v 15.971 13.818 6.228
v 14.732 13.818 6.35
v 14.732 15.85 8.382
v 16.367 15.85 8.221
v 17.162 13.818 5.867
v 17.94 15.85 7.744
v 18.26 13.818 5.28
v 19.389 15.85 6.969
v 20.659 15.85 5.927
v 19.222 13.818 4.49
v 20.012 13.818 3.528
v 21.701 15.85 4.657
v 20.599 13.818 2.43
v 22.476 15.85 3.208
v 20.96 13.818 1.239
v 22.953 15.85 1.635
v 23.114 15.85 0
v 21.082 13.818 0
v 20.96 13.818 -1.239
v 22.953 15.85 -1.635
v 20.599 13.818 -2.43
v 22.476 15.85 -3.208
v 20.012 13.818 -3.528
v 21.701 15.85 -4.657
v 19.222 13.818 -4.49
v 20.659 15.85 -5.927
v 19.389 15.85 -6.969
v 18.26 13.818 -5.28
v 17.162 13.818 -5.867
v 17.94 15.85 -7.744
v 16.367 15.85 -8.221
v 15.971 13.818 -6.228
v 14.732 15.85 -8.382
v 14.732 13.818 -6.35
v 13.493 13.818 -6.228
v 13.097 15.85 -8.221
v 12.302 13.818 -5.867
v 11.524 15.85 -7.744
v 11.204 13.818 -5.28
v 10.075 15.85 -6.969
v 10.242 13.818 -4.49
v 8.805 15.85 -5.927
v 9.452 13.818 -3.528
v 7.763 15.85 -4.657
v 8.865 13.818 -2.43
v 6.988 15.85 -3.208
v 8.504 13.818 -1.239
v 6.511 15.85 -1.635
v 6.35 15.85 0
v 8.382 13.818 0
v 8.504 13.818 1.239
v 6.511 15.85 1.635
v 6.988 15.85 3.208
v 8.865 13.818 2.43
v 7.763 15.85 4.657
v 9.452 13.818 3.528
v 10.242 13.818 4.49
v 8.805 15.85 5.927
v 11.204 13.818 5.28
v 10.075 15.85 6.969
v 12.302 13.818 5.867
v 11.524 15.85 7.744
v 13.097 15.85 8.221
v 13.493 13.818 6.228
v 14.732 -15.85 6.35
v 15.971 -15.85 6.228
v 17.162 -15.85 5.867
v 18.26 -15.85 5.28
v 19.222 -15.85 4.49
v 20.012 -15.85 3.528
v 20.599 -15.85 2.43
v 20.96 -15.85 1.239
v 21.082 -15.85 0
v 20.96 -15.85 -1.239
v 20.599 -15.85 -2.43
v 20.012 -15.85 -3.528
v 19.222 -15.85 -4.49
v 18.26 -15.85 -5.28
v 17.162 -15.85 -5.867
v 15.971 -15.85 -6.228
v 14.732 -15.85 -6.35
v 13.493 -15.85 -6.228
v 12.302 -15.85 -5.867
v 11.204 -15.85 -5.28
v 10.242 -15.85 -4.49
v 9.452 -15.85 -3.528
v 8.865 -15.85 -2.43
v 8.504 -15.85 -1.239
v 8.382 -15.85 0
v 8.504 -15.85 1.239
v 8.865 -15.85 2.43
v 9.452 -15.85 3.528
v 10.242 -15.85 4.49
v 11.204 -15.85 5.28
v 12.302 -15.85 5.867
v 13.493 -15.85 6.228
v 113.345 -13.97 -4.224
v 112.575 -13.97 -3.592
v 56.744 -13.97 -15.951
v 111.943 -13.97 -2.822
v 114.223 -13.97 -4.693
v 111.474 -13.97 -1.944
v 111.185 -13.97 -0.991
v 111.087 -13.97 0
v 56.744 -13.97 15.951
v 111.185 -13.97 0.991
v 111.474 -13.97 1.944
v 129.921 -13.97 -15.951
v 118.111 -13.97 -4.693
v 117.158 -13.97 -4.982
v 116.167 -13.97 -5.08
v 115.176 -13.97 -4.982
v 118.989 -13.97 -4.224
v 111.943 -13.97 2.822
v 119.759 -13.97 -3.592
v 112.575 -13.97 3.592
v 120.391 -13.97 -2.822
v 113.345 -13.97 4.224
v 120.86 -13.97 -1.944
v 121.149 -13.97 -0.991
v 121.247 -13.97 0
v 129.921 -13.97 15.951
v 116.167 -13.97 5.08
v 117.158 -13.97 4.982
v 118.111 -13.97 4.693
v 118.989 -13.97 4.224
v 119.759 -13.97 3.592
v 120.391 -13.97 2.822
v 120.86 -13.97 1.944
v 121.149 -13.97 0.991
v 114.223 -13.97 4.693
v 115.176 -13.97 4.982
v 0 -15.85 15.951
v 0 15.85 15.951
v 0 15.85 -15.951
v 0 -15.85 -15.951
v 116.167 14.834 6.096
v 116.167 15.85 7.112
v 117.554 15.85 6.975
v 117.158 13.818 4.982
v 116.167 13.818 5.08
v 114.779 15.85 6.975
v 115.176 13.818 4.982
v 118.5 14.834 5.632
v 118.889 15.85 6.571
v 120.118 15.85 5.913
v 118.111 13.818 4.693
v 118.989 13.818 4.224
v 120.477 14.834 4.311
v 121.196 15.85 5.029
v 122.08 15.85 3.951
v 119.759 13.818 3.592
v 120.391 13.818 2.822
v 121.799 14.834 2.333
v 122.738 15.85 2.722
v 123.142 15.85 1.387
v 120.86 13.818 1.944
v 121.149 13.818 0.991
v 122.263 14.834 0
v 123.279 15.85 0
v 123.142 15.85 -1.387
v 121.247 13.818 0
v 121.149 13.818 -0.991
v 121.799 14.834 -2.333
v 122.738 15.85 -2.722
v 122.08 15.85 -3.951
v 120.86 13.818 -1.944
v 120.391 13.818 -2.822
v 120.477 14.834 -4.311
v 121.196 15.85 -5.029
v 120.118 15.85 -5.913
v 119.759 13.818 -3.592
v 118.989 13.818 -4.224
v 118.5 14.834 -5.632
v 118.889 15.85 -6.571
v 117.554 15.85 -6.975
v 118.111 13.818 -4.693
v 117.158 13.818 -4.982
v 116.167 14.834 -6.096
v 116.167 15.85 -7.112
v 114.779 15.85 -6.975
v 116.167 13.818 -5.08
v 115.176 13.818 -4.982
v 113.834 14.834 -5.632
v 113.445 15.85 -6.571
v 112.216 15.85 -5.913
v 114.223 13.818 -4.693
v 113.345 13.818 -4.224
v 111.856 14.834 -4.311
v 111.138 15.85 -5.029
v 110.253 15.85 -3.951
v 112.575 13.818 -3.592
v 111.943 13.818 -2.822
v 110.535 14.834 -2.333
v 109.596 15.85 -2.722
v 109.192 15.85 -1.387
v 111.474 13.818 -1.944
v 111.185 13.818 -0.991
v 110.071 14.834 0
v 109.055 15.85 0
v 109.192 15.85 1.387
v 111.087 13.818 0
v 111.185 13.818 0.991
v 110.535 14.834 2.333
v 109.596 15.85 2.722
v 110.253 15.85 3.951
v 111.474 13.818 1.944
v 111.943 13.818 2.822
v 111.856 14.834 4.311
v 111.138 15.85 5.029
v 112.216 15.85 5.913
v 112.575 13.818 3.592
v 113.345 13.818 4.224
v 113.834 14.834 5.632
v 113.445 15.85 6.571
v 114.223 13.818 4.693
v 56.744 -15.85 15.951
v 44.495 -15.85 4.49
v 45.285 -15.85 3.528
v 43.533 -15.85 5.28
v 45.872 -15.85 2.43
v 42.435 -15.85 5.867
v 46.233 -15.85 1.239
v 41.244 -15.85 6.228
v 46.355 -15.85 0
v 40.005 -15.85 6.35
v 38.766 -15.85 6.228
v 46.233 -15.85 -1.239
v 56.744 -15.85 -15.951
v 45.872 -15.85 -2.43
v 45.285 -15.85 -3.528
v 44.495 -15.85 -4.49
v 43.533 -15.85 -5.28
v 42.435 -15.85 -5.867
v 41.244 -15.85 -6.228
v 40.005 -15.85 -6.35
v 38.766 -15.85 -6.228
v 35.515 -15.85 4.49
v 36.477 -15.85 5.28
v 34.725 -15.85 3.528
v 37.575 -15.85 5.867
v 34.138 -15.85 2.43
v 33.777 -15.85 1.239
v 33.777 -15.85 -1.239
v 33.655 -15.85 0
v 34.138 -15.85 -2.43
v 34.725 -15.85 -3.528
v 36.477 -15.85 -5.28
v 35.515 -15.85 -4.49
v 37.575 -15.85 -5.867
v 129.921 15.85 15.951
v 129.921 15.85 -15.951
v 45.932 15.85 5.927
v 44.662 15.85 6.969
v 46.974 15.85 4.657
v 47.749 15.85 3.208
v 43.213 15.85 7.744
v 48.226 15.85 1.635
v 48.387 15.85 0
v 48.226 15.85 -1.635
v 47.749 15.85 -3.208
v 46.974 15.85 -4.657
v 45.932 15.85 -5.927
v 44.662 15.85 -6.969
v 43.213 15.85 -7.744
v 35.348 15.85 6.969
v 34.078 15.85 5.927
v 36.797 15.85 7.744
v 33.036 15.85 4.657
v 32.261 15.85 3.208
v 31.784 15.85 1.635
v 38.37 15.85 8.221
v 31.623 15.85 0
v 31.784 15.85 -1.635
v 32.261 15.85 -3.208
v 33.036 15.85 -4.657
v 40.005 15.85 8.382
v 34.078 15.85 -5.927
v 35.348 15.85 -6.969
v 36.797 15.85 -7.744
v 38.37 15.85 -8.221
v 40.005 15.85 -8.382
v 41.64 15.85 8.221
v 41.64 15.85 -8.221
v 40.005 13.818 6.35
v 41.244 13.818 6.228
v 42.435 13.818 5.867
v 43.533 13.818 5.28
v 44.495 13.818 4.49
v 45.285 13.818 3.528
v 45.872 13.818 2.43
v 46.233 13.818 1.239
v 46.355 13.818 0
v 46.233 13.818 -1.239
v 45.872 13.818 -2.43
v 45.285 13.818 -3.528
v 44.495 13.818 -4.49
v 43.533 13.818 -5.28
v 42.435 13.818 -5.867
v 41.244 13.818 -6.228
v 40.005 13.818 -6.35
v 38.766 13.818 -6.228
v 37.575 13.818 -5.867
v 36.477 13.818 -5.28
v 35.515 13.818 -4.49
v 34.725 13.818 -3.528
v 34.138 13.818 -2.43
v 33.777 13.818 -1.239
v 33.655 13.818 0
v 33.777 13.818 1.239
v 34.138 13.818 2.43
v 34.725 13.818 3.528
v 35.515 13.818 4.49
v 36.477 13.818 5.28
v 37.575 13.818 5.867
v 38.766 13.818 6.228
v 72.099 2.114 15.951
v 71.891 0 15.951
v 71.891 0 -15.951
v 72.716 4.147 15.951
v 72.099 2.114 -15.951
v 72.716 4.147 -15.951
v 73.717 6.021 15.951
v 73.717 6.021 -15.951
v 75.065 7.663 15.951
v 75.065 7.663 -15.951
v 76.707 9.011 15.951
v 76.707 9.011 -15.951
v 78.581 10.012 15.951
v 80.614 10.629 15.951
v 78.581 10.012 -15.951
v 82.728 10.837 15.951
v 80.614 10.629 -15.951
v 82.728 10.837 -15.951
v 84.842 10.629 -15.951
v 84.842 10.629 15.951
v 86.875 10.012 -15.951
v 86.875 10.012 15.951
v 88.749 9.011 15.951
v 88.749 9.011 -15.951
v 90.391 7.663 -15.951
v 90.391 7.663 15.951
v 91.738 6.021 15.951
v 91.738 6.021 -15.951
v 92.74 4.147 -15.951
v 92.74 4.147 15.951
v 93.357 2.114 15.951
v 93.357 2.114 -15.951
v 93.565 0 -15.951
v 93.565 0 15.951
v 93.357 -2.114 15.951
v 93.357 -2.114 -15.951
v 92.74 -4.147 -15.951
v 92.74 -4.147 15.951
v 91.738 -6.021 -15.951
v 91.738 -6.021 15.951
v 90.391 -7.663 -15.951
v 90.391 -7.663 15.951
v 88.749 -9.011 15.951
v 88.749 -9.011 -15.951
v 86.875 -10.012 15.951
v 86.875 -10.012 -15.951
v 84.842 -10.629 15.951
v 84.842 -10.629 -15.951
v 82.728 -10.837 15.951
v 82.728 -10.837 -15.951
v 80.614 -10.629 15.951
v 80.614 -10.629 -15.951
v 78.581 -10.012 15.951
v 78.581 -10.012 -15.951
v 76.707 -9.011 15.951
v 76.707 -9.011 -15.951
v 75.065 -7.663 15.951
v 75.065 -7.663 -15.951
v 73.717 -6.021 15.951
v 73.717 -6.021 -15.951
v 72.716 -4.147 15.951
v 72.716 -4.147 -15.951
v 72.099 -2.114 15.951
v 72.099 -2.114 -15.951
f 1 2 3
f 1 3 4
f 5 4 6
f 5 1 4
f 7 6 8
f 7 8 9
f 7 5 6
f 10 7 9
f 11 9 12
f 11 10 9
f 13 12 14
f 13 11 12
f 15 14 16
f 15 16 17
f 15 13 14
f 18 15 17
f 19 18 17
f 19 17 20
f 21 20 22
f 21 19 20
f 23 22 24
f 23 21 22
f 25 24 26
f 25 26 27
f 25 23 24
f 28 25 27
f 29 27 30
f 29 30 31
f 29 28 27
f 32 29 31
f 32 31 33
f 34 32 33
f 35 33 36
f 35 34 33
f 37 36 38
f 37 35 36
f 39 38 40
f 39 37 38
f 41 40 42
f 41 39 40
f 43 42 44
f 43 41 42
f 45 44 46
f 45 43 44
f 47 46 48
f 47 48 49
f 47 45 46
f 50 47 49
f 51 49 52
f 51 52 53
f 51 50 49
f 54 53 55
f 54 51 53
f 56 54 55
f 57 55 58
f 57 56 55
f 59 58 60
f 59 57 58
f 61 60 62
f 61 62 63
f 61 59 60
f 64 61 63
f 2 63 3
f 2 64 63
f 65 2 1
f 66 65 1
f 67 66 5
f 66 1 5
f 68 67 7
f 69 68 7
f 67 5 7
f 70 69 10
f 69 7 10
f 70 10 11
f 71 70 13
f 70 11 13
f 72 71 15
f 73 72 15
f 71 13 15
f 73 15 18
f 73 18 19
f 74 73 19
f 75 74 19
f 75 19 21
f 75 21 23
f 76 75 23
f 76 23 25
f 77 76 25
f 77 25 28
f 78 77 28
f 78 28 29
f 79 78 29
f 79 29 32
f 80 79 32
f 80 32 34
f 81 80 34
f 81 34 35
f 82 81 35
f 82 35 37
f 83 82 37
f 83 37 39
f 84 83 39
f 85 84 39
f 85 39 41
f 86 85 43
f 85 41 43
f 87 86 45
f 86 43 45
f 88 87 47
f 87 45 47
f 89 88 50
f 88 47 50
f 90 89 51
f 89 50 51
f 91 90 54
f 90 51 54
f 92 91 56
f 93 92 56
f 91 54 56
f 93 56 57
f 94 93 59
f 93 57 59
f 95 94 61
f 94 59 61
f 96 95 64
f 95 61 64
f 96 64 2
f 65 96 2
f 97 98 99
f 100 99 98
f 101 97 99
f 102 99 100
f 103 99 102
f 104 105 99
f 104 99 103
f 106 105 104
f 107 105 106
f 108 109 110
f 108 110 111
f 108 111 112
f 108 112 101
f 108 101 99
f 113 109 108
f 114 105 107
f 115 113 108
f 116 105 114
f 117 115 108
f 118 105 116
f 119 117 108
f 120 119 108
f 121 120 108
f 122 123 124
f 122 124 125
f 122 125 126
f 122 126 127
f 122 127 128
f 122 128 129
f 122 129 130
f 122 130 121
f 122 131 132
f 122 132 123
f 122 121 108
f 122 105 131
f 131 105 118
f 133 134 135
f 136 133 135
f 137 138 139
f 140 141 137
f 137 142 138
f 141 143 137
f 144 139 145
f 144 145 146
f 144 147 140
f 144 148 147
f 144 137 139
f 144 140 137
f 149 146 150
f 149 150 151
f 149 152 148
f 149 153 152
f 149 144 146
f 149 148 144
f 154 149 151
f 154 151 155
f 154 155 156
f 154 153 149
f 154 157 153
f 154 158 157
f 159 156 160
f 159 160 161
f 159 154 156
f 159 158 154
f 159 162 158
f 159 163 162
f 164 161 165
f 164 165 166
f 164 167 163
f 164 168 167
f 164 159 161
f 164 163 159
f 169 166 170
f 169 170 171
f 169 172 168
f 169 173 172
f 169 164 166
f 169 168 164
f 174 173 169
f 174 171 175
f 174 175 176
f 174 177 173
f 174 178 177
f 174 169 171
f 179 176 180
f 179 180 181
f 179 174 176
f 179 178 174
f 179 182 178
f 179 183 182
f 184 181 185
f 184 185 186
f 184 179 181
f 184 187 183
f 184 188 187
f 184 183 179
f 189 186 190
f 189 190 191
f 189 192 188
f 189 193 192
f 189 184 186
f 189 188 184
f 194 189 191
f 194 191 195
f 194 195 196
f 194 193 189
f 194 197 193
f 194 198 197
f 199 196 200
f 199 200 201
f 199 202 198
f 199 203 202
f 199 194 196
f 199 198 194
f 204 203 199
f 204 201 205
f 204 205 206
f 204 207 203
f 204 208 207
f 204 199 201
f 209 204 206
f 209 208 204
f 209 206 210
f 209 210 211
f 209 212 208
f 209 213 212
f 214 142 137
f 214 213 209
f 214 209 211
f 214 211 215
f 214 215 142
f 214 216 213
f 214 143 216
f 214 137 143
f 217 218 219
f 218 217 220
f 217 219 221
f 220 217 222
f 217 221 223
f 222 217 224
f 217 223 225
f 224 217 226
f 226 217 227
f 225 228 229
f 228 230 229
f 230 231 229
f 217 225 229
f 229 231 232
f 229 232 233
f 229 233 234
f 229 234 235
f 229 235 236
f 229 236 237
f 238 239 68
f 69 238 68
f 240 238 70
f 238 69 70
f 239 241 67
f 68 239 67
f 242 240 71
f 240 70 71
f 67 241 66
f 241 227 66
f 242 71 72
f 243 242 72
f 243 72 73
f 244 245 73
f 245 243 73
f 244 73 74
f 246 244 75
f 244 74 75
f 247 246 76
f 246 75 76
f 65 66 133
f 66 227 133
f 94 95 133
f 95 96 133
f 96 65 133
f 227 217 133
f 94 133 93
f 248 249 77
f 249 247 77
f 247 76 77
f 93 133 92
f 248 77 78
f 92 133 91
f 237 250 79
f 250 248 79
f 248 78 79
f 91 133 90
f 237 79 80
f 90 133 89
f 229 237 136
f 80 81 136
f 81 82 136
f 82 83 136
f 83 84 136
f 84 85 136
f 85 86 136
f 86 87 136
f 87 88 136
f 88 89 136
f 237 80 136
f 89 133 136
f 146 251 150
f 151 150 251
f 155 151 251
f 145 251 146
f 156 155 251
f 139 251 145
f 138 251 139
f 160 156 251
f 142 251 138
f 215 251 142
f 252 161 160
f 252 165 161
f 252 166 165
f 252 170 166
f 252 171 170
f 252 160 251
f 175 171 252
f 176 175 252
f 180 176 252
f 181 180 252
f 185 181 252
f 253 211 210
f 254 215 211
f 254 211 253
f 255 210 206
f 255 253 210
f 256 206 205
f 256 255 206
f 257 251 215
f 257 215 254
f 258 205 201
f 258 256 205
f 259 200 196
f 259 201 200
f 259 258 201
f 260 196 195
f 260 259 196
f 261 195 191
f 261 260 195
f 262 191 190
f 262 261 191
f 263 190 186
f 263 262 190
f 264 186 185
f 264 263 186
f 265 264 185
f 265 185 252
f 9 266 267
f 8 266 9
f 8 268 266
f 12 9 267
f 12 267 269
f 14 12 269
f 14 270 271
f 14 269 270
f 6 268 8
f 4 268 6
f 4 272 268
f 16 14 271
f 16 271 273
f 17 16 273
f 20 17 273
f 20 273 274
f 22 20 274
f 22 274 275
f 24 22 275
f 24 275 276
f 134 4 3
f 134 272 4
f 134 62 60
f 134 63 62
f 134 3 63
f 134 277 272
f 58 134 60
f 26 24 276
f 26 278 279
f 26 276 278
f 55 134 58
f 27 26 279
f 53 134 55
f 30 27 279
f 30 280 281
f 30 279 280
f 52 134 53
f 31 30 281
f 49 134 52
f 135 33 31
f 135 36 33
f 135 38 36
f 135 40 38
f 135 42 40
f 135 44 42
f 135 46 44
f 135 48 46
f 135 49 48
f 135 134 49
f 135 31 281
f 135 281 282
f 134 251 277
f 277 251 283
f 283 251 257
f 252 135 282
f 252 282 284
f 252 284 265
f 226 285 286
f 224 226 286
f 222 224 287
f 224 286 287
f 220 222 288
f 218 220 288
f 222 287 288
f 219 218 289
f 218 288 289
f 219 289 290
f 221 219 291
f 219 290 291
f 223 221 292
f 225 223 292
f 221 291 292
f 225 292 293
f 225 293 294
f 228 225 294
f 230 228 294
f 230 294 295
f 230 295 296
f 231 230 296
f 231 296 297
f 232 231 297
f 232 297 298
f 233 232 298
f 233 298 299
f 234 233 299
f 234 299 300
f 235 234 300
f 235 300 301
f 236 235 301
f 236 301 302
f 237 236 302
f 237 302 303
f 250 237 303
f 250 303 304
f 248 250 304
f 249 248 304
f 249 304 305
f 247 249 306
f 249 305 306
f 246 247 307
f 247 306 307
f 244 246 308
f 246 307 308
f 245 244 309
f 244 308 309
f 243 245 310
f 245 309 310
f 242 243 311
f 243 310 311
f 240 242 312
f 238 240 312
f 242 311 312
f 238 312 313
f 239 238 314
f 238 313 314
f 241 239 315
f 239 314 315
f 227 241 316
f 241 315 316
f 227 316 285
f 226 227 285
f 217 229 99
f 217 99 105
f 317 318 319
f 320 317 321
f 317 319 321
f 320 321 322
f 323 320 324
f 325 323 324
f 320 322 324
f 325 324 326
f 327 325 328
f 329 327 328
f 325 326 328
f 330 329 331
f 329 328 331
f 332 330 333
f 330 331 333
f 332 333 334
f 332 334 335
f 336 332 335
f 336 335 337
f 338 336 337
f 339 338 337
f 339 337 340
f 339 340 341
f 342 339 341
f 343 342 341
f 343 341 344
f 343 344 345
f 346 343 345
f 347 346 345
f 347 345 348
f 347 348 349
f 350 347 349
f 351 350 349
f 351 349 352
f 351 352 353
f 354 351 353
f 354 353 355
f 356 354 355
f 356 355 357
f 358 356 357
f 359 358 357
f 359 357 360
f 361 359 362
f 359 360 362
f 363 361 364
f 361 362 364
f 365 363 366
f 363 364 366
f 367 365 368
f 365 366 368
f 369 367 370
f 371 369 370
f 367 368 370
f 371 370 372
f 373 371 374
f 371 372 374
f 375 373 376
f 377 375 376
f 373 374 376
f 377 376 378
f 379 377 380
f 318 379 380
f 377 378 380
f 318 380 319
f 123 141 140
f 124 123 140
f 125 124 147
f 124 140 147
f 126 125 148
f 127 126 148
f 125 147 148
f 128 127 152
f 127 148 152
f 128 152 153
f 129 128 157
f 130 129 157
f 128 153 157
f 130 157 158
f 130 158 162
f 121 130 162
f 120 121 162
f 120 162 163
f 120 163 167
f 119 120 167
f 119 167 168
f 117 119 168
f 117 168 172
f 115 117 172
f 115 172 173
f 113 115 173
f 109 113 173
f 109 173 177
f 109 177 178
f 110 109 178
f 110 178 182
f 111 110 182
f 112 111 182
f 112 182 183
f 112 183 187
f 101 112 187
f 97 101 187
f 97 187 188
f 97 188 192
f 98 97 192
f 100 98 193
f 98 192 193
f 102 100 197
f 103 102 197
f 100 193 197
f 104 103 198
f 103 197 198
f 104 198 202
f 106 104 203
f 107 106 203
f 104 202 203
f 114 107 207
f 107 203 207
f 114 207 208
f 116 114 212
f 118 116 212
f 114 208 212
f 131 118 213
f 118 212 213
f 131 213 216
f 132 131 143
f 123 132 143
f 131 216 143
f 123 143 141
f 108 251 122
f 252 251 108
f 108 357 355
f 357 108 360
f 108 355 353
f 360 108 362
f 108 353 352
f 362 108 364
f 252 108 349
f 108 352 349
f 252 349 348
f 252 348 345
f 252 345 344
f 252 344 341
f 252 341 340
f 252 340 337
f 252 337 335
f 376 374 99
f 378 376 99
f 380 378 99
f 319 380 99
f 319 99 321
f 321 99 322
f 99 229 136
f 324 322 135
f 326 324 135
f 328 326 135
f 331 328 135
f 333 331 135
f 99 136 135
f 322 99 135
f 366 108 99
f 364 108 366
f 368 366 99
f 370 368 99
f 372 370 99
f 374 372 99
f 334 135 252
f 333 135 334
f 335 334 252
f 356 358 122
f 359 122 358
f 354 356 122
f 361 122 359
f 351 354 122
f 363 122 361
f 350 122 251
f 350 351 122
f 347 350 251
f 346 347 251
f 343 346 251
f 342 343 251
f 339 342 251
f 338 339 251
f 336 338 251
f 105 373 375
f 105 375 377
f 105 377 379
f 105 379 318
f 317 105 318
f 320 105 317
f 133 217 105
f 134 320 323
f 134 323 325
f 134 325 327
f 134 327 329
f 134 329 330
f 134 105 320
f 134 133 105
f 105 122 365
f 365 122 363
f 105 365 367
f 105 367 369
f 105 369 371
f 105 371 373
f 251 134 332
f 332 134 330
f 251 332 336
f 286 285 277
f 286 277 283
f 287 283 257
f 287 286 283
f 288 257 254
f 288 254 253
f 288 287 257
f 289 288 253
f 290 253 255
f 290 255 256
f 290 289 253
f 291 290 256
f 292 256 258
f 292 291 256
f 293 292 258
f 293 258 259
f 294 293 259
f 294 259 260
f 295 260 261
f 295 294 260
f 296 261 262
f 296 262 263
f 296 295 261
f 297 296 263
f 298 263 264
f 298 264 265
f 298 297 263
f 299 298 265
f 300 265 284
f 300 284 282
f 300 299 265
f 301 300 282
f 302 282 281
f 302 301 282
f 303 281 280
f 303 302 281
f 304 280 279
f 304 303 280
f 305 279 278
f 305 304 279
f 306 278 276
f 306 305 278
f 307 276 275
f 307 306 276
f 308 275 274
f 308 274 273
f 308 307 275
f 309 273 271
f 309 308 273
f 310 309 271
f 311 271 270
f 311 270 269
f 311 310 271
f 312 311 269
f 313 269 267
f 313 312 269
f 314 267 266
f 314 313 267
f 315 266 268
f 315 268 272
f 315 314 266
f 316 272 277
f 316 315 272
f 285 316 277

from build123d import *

# Parameters (mm, degrees)
SKETCH1_W           = 31.9024
SKETCH1_H           = 31.6992
BOSS_EXTRUDE1_DEPTH = 129.921
SKETCH2_W           = 73.1774
SKETCH2_H           = 31.9024
CUT_EXTRUDE1_DEPTH  = 1.8796
SKETCH4_R           = 6.35
SKETCH4_R_2         = 5.08
CUT_EXTRUDE2_DEPTH  = 135.68016299
CHAMFER2_SIZE       = 2.032
SKETCH9_R           = 10.836935607
CUT_EXTRUDE3_DEPTH  = 135.716143008


with BuildPart() as part:
    # Sketch1 → Boss-Extrude1 (new body)
    with BuildSketch(Plane(origin=(0, 0, 0), x_dir=(0, 0, -1), z_dir=(1, 0, 0))):
        Rectangle(SKETCH1_W, SKETCH1_H)
    extrude(amount=BOSS_EXTRUDE1_DEPTH)

    # Sketch2 → Cut-Extrude1 (cut)
    with BuildSketch(Plane.XZ.offset(15.8496)):
        with Locations((93.3323, 0)):
            Rectangle(SKETCH2_W, SKETCH2_H)
    extrude(amount=-CUT_EXTRUDE1_DEPTH, mode=Mode.SUBTRACT)

    # Sketch4 → Cut-Extrude2 (cut, through all)
    with BuildSketch(Plane(origin=(0, 15.8496, 0), x_dir=(1, 0, 0), z_dir=(0, 1, 0))):
        with Locations(Location((40.005, 0, 0), (0, 0, 270))):
            Circle(SKETCH4_R)
        with Locations(Location((14.732, 0, 0), (0, 0, 270))):
            Circle(SKETCH4_R)
        with Locations(Location((116.1669, 0, 0), (0, 0, 270))):
            Circle(SKETCH4_R_2)
    extrude(amount=-CUT_EXTRUDE2_DEPTH, mode=Mode.SUBTRACT)

    # Chamfer2
    chamfer2_edges = [part.edges().sort_by_distance(p)[0] for p in [
        (116.1669, 15.8496, -5.08),
        (14.732, 15.8496, -6.35),
        (40.005, 15.8496, -6.35),
    ]]
    chamfer(chamfer2_edges, length=CHAMFER2_SIZE)

    # Sketch9 → Cut-Extrude3 (cut, through all)
    with BuildSketch(Plane(origin=(0, 0, -15.9512), x_dir=(-1, 0, 0), z_dir=(0, 0, -1))):
        with Locations((-82.727824096, 0)):
            Circle(SKETCH9_R)
    extrude(amount=-CUT_EXTRUDE3_DEPTH, mode=Mode.SUBTRACT)


solid = part.part
